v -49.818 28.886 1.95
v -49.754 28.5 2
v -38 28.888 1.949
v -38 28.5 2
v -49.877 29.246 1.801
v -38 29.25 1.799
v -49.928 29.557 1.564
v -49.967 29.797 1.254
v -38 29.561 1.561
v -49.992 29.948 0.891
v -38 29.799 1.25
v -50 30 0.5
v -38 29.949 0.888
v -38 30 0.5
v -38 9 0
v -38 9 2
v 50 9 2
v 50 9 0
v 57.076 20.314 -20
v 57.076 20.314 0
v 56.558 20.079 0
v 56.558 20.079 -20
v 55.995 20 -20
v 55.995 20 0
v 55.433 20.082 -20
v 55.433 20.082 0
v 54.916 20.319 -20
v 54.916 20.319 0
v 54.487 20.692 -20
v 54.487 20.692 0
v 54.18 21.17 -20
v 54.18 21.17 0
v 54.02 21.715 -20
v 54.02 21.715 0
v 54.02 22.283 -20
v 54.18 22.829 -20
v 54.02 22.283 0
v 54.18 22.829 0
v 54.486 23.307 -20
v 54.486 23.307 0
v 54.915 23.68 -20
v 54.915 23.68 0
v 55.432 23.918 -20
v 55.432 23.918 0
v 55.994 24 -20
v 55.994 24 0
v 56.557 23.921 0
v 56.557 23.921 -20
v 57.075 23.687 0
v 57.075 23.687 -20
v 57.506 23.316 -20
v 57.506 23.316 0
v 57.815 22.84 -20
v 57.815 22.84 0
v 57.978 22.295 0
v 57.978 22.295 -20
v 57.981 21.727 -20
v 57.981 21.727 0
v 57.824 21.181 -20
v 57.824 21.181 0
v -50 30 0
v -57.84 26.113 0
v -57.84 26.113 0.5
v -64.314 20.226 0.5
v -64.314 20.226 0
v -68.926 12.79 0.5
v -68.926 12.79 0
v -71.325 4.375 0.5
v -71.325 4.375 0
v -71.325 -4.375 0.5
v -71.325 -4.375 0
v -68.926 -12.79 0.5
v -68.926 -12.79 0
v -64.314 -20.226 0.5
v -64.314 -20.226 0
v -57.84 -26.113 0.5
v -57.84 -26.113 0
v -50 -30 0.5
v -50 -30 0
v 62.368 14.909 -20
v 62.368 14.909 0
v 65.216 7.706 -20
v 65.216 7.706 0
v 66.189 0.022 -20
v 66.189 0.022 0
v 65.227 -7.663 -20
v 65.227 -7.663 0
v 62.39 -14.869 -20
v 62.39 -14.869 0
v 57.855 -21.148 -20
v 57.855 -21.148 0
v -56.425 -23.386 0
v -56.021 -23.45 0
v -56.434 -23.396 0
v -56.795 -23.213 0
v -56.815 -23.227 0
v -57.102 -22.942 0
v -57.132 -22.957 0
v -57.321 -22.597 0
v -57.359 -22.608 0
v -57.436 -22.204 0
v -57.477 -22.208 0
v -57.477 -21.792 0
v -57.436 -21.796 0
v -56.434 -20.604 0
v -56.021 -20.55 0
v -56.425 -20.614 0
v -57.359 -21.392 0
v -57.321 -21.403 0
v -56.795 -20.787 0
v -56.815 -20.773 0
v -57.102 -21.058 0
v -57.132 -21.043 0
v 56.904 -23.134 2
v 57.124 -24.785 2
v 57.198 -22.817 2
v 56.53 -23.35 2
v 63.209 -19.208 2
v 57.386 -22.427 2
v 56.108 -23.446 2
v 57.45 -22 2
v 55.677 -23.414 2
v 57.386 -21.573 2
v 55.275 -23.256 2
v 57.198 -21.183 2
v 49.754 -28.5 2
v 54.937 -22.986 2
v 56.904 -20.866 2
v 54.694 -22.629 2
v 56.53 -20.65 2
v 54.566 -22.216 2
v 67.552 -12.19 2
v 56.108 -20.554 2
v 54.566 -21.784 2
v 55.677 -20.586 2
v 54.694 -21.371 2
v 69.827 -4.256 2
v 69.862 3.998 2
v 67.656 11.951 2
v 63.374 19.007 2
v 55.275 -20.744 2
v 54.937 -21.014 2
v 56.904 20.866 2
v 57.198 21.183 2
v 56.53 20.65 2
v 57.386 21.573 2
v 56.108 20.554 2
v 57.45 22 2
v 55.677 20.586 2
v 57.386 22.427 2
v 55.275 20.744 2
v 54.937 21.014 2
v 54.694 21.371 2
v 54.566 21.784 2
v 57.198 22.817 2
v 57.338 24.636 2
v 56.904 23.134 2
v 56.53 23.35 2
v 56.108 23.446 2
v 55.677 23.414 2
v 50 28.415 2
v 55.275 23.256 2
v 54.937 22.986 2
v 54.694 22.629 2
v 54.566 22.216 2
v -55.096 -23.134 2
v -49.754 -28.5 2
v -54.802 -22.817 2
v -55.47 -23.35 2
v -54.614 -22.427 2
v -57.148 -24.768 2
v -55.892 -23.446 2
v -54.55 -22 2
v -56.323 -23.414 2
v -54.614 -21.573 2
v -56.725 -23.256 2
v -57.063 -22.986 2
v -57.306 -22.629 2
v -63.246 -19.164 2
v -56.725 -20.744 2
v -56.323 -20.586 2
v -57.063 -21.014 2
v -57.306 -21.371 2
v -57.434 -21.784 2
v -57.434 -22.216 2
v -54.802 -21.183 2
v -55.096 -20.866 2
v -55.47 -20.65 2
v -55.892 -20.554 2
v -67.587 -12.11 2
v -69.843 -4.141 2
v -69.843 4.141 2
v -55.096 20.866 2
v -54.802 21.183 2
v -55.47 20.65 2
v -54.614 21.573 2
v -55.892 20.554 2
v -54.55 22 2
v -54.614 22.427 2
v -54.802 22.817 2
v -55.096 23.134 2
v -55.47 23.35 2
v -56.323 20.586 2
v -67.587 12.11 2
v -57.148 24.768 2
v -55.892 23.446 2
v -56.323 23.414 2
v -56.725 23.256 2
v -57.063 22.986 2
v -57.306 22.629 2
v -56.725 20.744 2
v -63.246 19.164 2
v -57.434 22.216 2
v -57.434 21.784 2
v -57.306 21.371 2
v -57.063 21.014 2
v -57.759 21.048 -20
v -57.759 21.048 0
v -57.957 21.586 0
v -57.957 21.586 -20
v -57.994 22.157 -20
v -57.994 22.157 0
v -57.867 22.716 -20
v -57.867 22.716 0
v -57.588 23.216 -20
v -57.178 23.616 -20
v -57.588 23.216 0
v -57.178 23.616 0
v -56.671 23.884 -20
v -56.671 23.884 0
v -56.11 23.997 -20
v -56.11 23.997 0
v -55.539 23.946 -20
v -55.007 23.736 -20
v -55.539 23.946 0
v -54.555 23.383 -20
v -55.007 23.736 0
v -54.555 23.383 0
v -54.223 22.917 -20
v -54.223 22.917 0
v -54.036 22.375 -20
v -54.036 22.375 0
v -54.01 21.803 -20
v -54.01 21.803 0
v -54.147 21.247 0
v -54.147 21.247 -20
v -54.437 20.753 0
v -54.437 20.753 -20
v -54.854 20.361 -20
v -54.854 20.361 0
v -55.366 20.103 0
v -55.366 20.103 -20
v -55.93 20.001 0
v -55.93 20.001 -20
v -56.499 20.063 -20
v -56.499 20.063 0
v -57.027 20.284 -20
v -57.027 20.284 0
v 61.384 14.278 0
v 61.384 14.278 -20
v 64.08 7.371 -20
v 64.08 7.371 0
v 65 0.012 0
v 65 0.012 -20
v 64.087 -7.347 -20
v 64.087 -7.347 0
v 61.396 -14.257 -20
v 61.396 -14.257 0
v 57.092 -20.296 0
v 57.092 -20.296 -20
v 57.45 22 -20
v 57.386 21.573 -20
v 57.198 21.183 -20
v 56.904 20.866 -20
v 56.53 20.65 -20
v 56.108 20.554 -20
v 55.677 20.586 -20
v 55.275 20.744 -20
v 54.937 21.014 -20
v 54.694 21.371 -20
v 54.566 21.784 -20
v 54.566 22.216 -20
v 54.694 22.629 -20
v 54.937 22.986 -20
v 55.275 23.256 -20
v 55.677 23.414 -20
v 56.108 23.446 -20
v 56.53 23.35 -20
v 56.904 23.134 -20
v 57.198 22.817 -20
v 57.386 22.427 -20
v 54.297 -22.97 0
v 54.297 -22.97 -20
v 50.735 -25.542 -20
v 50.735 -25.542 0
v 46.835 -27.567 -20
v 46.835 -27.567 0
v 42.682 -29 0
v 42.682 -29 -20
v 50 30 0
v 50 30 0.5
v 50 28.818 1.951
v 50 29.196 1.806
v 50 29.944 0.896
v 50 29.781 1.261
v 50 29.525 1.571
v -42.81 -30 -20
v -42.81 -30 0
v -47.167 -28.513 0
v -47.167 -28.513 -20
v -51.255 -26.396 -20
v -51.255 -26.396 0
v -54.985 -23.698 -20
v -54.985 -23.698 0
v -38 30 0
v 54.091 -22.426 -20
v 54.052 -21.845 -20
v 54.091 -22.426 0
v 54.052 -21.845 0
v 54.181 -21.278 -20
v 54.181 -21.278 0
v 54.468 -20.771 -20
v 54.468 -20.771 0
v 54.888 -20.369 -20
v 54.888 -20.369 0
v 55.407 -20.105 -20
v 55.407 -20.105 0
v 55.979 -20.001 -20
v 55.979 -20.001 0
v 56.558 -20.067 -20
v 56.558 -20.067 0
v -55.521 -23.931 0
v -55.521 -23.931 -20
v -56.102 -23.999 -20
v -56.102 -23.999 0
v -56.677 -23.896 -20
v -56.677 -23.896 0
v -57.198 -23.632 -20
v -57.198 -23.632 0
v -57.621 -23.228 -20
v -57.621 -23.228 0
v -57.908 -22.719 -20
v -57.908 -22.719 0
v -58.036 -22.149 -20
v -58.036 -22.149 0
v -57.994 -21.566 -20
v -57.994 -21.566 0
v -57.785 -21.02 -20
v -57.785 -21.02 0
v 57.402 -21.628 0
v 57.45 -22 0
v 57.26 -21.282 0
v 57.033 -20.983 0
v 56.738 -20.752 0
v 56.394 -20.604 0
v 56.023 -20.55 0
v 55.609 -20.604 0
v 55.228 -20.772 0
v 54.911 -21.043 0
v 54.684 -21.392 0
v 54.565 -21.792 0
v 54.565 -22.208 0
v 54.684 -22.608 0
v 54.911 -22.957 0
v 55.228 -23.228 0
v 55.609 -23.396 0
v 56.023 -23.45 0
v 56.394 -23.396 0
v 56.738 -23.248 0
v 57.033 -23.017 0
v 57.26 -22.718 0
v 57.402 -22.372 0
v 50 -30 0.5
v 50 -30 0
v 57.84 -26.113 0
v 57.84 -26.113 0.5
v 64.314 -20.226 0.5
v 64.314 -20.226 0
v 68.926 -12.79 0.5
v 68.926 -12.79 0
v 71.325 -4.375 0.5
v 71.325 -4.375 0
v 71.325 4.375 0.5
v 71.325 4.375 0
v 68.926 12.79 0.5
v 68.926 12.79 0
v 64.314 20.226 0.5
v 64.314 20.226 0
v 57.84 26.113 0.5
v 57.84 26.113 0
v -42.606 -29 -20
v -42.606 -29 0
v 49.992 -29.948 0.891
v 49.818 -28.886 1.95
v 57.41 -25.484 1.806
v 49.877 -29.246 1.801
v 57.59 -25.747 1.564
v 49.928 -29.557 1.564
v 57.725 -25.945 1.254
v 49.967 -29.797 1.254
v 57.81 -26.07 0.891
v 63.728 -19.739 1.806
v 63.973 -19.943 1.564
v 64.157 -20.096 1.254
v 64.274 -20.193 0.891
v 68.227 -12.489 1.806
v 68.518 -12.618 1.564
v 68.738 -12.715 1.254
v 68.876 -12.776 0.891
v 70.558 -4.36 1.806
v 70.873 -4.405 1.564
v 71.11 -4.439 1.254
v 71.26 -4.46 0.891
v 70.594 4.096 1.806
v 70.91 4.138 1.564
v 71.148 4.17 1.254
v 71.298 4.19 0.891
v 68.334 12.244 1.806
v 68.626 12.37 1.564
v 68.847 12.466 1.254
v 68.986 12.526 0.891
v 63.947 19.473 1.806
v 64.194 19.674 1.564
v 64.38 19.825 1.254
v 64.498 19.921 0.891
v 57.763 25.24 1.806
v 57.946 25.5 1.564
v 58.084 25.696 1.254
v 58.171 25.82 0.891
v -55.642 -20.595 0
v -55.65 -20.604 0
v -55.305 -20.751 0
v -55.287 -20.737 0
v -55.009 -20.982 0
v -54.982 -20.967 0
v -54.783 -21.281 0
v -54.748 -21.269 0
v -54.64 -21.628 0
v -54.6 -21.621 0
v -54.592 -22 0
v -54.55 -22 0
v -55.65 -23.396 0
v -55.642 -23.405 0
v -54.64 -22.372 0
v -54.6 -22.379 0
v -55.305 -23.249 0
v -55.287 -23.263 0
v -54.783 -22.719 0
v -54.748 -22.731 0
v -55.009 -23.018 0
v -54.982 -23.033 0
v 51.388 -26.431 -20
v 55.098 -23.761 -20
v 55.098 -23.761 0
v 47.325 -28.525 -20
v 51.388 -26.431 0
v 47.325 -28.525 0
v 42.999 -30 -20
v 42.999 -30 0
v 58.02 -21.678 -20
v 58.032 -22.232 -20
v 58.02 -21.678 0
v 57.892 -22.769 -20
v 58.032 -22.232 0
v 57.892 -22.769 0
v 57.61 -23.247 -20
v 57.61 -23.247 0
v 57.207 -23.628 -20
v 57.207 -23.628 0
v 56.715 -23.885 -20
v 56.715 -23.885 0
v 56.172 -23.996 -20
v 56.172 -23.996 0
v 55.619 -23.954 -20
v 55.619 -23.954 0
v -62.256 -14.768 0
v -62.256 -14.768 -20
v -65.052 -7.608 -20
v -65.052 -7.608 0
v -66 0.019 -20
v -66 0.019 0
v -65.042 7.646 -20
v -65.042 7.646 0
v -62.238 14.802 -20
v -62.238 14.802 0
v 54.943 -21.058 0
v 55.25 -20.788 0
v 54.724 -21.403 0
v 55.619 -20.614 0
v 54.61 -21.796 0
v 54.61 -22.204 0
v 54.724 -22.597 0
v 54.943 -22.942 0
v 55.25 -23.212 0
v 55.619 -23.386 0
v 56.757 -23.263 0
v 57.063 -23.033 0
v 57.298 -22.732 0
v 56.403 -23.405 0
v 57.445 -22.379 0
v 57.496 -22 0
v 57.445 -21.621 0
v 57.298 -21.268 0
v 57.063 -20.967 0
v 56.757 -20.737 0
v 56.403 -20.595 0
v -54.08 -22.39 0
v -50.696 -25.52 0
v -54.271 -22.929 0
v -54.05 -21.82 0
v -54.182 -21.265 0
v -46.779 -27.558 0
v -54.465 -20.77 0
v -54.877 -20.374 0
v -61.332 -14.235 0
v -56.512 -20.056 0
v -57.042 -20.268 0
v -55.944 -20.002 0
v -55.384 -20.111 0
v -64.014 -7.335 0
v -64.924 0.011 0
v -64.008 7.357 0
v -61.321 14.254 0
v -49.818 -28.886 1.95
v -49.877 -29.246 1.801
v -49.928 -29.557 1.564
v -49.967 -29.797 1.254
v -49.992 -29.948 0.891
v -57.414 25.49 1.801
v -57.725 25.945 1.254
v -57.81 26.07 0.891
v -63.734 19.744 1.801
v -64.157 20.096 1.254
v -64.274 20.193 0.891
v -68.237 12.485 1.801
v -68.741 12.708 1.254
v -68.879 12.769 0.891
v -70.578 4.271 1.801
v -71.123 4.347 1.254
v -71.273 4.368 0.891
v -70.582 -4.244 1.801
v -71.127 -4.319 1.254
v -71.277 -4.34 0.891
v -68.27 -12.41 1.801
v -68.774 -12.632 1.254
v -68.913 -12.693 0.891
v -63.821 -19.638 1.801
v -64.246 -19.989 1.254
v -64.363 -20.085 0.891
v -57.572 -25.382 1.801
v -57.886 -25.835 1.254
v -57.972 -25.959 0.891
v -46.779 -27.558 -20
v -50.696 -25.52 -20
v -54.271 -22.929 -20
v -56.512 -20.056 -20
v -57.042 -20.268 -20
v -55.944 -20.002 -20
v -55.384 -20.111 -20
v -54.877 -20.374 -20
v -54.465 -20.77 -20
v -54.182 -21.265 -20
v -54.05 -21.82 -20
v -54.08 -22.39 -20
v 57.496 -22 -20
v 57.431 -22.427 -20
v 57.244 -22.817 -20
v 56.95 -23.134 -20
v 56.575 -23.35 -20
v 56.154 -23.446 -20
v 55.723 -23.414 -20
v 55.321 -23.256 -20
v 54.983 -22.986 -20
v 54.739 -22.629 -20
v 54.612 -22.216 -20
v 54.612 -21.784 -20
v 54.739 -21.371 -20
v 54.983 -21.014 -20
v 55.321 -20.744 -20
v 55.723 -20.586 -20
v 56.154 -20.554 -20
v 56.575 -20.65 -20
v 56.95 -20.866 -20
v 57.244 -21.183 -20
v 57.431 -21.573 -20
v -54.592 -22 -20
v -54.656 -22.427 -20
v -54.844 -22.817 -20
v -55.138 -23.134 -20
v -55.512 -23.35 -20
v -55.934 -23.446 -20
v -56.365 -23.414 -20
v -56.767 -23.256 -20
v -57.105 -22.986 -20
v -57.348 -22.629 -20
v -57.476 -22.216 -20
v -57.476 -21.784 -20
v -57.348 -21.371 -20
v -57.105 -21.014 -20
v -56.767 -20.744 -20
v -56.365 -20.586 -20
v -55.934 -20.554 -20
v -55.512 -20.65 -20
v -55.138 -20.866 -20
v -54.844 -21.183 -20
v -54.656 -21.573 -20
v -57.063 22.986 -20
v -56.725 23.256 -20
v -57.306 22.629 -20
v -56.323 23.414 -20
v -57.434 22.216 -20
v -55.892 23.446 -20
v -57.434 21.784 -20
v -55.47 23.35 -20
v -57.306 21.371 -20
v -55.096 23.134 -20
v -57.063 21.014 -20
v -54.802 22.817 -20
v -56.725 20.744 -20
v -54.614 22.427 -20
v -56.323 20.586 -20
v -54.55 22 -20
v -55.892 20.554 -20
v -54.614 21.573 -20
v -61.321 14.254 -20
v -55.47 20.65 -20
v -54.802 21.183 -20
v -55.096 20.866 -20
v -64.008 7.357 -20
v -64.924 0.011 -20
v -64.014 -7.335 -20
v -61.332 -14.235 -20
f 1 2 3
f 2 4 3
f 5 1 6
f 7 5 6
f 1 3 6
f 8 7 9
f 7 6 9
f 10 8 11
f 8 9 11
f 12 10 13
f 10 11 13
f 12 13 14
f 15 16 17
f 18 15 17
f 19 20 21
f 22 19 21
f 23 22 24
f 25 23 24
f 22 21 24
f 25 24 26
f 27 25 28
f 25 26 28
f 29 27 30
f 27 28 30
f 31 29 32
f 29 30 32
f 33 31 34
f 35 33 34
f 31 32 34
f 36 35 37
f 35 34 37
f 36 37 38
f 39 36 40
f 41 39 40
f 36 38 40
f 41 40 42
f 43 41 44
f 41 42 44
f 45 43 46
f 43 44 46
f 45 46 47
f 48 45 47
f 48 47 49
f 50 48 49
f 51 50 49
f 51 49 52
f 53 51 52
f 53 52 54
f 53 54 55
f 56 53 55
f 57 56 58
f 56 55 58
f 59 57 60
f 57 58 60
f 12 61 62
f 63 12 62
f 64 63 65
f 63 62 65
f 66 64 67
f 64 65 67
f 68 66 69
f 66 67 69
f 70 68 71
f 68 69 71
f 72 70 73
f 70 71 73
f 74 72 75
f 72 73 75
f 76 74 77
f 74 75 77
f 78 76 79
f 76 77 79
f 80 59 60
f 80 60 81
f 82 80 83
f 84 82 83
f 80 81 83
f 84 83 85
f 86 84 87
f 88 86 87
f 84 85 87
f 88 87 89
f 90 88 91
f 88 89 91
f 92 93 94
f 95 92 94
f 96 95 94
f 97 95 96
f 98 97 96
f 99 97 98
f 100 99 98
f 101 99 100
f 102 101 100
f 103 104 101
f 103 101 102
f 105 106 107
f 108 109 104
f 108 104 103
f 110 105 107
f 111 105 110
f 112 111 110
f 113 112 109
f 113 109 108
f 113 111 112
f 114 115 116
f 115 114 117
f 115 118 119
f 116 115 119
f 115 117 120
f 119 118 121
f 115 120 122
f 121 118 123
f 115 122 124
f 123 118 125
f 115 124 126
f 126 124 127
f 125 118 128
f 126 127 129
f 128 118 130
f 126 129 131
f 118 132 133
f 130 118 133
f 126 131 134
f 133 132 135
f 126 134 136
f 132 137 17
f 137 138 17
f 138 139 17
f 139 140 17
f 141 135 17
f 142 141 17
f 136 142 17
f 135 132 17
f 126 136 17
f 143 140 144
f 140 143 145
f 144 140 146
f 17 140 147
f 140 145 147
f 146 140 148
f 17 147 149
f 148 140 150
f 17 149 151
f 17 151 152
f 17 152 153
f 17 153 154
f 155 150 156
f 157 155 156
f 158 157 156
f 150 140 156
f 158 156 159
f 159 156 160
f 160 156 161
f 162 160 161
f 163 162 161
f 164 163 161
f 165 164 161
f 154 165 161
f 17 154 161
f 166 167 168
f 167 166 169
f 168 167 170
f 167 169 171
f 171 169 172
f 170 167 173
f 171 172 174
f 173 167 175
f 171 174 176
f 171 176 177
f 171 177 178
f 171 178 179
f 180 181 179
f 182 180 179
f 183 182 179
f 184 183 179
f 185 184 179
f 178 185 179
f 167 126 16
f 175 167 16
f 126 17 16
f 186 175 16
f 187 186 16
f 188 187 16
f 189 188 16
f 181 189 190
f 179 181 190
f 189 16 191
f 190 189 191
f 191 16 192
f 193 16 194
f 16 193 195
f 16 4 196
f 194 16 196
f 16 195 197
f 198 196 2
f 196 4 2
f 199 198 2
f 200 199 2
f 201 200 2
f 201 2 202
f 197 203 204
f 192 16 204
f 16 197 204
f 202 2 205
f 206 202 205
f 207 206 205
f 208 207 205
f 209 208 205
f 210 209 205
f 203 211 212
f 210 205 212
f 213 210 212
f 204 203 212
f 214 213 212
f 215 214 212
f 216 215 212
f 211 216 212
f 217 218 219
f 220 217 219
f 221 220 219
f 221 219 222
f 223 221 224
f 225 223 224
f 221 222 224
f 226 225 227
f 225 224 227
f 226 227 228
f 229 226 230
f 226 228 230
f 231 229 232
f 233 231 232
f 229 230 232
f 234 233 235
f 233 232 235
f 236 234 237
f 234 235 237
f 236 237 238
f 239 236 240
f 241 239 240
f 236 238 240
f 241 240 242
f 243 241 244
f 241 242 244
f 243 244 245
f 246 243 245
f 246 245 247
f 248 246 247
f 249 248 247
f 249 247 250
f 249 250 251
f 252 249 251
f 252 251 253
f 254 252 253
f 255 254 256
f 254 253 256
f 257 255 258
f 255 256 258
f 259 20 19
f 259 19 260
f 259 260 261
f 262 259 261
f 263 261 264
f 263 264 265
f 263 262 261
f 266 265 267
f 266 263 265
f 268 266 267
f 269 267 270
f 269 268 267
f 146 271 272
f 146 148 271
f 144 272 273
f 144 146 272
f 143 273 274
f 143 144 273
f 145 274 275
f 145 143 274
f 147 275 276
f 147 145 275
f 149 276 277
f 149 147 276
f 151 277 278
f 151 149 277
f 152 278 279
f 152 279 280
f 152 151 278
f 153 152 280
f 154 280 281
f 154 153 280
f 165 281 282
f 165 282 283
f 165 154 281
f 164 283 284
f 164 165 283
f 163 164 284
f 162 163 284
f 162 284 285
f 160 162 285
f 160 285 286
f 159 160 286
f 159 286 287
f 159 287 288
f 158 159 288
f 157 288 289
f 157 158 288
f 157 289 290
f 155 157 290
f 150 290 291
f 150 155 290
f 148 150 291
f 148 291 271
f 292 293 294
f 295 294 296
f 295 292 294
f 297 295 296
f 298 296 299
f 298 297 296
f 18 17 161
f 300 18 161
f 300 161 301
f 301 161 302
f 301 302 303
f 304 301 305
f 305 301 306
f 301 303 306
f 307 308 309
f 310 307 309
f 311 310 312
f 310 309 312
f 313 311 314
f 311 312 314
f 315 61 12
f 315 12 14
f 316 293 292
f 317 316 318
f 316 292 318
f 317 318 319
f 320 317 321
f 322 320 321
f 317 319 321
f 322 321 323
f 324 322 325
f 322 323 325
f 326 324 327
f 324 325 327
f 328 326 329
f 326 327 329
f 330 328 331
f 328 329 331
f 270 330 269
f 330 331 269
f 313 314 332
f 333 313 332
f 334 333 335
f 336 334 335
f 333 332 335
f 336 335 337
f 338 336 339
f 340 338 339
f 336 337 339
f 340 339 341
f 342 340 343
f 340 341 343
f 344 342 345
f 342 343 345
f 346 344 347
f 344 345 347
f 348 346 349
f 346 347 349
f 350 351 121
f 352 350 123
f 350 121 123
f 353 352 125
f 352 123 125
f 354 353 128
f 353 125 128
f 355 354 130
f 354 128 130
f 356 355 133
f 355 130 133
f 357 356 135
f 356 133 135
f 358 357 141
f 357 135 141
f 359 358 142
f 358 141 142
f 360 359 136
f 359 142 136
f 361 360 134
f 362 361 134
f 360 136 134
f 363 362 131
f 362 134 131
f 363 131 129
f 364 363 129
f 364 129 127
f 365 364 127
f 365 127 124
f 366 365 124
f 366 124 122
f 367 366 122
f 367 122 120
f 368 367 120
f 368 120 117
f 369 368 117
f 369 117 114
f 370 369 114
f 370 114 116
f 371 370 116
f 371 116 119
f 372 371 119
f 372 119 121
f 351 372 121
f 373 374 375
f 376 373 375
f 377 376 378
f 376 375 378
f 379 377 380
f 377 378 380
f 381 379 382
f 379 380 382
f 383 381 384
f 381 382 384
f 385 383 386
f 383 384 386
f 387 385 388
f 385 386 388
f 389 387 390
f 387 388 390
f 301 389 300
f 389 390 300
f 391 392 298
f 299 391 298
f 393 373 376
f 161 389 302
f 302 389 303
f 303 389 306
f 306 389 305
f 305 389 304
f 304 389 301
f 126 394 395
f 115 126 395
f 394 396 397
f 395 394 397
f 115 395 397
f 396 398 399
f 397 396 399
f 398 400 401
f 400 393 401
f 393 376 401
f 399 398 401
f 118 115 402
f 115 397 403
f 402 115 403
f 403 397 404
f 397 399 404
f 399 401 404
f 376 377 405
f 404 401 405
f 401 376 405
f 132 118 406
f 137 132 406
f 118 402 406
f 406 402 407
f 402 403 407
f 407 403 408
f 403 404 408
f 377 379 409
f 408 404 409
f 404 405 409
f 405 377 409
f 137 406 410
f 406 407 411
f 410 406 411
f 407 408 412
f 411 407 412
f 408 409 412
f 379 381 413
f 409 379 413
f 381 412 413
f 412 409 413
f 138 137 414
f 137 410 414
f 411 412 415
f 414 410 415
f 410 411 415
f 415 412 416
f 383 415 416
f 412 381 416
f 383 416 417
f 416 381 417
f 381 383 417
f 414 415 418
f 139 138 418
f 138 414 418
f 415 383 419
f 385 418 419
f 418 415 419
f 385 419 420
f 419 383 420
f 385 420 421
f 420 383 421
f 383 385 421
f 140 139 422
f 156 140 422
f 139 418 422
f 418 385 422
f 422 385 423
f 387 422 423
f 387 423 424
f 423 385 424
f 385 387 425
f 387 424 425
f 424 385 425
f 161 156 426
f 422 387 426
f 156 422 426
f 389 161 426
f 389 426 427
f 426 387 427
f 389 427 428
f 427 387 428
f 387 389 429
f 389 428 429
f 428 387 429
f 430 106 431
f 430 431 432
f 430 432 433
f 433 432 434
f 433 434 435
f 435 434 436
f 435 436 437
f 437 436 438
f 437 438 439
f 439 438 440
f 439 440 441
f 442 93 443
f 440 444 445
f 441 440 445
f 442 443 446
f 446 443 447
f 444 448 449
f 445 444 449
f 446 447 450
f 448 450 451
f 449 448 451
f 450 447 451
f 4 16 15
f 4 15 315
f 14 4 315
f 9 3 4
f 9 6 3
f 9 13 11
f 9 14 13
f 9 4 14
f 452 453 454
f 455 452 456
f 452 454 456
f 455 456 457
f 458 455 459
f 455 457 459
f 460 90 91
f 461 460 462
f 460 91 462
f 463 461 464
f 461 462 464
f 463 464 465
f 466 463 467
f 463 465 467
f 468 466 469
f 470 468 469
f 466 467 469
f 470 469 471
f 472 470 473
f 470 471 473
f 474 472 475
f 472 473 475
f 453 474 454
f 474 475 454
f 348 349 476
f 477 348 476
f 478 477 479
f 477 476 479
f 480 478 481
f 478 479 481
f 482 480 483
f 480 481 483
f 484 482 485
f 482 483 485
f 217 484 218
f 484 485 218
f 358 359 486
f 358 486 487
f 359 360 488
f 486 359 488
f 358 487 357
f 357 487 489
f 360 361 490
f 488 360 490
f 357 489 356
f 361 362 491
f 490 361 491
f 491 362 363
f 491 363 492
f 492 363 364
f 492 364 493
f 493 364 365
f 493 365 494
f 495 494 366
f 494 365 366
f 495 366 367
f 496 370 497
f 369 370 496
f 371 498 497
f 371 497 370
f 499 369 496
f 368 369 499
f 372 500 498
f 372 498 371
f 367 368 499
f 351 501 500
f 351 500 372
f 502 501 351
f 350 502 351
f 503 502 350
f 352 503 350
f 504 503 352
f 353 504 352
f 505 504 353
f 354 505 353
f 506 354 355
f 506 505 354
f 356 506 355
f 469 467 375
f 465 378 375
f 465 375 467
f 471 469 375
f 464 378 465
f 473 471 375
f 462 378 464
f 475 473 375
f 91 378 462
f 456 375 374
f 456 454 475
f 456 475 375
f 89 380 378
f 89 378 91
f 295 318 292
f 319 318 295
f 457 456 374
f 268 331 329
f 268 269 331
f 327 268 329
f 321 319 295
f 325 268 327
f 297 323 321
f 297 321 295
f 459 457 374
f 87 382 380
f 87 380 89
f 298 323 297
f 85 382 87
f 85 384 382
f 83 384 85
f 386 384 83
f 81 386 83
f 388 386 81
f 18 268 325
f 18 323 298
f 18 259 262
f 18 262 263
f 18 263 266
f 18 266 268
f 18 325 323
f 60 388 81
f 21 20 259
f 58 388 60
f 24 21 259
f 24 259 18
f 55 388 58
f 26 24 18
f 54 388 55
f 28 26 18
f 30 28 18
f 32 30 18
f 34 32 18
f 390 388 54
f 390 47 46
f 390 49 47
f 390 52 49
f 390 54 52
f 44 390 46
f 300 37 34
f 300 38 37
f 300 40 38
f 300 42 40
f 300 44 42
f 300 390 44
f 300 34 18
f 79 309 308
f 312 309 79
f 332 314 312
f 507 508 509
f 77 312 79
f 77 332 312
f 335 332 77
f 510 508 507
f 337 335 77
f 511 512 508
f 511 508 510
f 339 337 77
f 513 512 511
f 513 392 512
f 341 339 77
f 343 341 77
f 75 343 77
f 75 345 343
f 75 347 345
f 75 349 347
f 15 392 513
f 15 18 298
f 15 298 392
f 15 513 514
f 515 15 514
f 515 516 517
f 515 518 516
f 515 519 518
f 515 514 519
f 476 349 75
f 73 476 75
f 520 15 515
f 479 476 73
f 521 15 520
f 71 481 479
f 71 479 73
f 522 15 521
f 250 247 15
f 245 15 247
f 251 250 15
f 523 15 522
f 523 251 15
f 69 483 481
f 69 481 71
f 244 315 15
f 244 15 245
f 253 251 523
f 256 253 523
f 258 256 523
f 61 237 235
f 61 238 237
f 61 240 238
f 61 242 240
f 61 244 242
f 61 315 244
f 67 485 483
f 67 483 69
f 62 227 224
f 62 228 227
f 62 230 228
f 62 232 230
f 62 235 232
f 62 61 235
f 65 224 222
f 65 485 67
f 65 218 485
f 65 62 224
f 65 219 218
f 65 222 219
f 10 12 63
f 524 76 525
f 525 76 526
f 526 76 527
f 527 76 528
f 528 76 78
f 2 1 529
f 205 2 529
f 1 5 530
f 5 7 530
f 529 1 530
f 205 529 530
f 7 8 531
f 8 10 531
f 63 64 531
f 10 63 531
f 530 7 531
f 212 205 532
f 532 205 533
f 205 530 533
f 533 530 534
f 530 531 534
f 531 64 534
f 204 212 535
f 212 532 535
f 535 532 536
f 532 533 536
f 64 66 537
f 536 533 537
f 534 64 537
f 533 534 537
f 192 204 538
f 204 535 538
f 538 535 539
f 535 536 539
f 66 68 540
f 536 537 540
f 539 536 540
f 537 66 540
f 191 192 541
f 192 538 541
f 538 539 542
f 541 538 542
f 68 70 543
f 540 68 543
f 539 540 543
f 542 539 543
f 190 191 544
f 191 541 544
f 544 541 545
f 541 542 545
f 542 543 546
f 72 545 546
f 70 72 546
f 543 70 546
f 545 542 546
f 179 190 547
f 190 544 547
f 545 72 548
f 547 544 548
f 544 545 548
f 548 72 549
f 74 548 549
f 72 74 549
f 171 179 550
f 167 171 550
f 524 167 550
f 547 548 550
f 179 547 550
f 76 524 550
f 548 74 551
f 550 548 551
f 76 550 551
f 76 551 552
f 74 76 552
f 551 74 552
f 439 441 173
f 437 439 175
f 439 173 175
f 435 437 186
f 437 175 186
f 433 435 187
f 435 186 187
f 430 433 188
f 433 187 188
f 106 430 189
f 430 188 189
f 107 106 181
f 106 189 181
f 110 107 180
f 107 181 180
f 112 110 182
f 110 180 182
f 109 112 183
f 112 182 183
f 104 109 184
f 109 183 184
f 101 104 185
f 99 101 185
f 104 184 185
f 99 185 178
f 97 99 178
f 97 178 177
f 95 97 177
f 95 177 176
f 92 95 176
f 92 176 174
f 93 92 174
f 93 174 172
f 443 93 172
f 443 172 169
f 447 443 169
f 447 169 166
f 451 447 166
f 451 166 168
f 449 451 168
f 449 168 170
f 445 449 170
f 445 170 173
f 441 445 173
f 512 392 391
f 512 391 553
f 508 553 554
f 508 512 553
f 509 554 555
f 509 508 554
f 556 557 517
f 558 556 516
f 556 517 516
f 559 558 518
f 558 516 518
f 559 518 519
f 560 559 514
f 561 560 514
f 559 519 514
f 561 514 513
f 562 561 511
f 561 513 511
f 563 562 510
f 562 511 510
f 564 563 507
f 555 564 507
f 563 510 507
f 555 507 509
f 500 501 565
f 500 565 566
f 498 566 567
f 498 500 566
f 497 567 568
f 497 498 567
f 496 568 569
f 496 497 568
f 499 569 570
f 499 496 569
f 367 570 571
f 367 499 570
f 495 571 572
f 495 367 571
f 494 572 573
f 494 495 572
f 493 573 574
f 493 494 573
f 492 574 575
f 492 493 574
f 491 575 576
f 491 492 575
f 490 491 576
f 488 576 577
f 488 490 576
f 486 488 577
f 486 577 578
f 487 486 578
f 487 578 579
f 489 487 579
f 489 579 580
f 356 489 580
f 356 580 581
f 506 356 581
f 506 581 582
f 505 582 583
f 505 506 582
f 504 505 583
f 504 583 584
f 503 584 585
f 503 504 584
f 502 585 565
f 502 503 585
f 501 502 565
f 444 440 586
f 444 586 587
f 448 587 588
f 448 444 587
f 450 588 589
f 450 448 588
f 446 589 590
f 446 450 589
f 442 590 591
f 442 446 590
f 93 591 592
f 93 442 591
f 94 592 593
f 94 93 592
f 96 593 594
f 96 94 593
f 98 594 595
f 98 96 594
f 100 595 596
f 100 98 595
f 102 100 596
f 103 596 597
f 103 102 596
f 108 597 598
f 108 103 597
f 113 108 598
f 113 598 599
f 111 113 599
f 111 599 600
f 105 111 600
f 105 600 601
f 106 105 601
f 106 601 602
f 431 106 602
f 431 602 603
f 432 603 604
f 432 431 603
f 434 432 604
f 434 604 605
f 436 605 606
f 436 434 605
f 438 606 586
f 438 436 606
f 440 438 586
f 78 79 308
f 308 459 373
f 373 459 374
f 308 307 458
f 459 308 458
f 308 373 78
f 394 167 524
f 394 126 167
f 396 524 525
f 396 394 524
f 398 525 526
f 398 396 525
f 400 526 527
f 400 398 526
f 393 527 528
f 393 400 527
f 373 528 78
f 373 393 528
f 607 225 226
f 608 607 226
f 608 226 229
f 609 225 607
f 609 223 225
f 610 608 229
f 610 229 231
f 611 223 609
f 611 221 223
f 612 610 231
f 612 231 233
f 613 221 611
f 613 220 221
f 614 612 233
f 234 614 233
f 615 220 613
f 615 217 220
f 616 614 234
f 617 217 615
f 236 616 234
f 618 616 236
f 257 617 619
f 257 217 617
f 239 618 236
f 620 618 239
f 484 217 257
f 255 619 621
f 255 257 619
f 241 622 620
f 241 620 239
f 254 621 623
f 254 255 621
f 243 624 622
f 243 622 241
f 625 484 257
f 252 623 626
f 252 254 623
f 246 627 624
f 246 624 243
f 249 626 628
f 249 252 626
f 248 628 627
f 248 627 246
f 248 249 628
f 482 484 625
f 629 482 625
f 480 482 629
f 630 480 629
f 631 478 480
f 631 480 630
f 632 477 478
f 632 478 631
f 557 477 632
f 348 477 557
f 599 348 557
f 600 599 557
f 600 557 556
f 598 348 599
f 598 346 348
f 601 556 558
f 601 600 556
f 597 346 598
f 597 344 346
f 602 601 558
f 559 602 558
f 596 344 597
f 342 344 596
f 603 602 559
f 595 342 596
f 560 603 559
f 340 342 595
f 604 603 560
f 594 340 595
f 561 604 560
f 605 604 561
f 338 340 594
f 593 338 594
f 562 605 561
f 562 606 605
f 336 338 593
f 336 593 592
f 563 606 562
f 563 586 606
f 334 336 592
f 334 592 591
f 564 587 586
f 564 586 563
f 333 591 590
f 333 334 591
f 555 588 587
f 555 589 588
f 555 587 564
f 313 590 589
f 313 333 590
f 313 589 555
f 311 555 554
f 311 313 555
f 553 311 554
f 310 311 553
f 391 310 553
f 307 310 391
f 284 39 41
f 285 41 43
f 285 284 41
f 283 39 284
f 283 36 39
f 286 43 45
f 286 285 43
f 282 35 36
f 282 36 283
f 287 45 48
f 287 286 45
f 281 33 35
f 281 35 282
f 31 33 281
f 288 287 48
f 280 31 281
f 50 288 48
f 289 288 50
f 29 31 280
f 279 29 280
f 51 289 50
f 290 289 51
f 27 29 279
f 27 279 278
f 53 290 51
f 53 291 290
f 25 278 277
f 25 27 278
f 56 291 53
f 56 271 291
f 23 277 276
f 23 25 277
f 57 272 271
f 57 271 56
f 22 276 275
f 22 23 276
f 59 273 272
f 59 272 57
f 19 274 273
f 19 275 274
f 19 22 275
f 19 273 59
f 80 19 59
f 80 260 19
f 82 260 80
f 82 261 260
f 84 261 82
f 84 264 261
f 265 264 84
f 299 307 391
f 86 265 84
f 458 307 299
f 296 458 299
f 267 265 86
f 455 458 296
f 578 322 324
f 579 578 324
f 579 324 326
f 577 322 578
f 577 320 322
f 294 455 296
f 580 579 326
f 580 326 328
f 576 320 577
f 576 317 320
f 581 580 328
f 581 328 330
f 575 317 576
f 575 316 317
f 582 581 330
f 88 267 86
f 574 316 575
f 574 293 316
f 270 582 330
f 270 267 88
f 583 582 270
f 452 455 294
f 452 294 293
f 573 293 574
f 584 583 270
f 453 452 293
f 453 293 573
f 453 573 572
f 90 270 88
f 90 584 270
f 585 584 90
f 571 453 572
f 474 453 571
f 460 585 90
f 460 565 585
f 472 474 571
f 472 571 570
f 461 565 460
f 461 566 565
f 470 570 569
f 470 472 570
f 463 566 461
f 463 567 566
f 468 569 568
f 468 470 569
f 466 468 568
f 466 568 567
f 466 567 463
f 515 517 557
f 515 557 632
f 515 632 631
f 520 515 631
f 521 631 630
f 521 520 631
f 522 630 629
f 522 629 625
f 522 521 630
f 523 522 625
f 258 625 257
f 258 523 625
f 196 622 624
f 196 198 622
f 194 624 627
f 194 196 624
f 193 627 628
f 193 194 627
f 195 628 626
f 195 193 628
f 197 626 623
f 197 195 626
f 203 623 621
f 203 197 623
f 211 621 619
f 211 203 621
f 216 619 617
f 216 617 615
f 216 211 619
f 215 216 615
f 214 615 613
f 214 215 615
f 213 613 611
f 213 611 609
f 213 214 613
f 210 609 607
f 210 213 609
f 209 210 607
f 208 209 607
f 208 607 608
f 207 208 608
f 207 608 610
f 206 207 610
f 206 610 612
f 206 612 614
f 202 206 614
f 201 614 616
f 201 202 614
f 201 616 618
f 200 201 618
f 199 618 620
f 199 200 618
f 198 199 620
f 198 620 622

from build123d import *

# Parameters (mm, degrees)
PAD_DEPTH       = 2
SKETCH001_W     = 88
SKETCH001_H     = 20.999999
POCKET_DEPTH    = 5
SKETCH002_R     = 1.45
POCKET001_DEPTH = 5
SKETCH005_R     = 1.45
PAD001_DEPTH    = 20
FILLET_R        = 1.5


with BuildPart() as part:
    # Sketch → Pad (new body)
    with BuildSketch(Plane.XY):
        with BuildLine():
            Line((-50.000004, 29.999999), (49.999993, 29.999999))
            ThreePointArc((49.999993, -29.999999), (71.628774, 0), (49.999993, 29.999999))
            Line((-50.000004, -29.999999), (49.999993, -29.999999))
            ThreePointArc((-50.000004, 29.999999), (-71.628785, 0), (-50.000004, -29.999999))
        make_face()
    extrude(amount=PAD_DEPTH)

    # Sketch001 (on Face6 of Pad) → Pocket (cut)
    with BuildSketch(Plane.XY.offset(2)):
        with Locations((6, 19.5)):
            Rectangle(SKETCH001_W, SKETCH001_H)
    extrude(amount=-POCKET_DEPTH, mode=Mode.SUBTRACT)

    # Sketch002 (on Face5 of Pocket) → Pocket001 (cut)
    with BuildSketch(Plane.XY.offset(2)):
        with Locations((-56, 22)):
            Circle(SKETCH002_R)
        with Locations((-56, -22)):
            Circle(SKETCH002_R)
        with Locations((56, 22)):
            Circle(SKETCH002_R)
        with Locations((56, -22)):
            Circle(SKETCH002_R)
    extrude(amount=-POCKET001_DEPTH, mode=Mode.SUBTRACT)

    # Sketch005 (on Sketch) → Pad001 (join)
    with BuildSketch(Plane(origin=(0, 0, 0), x_dir=(1, 0, 0), z_dir=(0, 0, -1))):
        with BuildLine():
            ThreePointArc((57.824475, -21.180678), (66.188679, -0.02241), (57.855075, 21.147928))
            ThreePointArc((57.855075, 21.147928), (57.421669, 23.451415), (55.098354, 23.761422))
            ThreePointArc((55.098354, 23.761422), (49.395322, 27.553068), (42.998941, 29.999999))
            Line((42.998941, 29.999999), (-42.810254, 29.999999))
            ThreePointArc((-42.810254, 29.999999), (-49.250438, 27.530438), (-54.985149, 23.697971))
            ThreePointArc((-54.985149, 23.697971), (-57.424375, 23.445333), (-57.785293, 21.019763))
            ThreePointArc((-57.785293, 21.019763), (-65.999994, -0.019369), (-57.759009, -21.048219))
            ThreePointArc((-57.759009, -21.048219), (-54.555317, -23.383073), (-57.02749, -20.284114))
            ThreePointArc((-57.042198, 20.268075), (-64.924214, -0.010881), (-57.02749, -20.284114))
            ThreePointArc((-57.042198, 20.268075), (-54.656994, 20.557152), (-54.270591, 22.928536))
            ThreePointArc((-42.606362, 28.999735), (-48.775213, 26.611086), (-54.270591, 22.928536))
            Line((-42.606362, 28.999735), (42.682146, 28.999735))
            ThreePointArc((54.296791, 22.970282), (48.822241, 26.626033), (42.682146, 28.999735))
            ThreePointArc((54.296791, 22.970282), (54.663143, 20.554788), (57.0925, 20.295848))
            ThreePointArc((57.075816, -20.313993), (64.999997, -0.012324), (57.0925, 20.295848))
            ThreePointArc((57.075816, -20.313993), (54.486491, -23.307399), (57.824475, -21.180678))
        make_face()
        with Locations((-56.041981, 22)):
            Circle(SKETCH005_R, mode=Mode.SUBTRACT)
        with Locations((56.045663, 22)):
            Circle(SKETCH005_R, mode=Mode.SUBTRACT)
        with Locations((56, -22)):
            Circle(SKETCH005_R, mode=Mode.SUBTRACT)
        with Locations((-56, -22)):
            Circle(SKETCH005_R, mode=Mode.SUBTRACT)
    extrude(amount=PAD001_DEPTH)

    # Fillet
    fillet_edges = [part.edges().sort_by_distance(p)[0] for p in [
        (-71.628785, 0, 2),
        (-44.000002, 29.999999, 2),
        (-5e-06, -29.999999, 2),
        (71.628774, -4e-06, 2),
    ]]
    fillet(fillet_edges, radius=FILLET_R)


solid = part.part
